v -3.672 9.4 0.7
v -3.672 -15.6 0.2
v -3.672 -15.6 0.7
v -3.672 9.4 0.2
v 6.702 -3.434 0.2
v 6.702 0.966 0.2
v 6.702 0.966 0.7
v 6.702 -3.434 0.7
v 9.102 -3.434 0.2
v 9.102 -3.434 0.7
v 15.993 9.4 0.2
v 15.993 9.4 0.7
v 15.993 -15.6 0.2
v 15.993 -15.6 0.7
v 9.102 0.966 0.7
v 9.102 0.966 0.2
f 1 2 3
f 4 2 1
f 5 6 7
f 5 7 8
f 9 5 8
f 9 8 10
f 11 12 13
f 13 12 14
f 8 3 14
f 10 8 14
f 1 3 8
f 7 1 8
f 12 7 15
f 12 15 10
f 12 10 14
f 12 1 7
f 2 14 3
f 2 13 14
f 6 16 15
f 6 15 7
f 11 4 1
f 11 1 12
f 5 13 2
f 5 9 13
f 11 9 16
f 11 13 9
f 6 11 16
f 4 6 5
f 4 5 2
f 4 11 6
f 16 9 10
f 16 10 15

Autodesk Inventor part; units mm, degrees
ref_plane "YZ Plane" through (0, 0, 0) normal (1, 0, 0) x (0, 1, 0)
ref_plane "XZ Plane" through (0, 0, 0) normal (0, 1, 0) x (-1, 0, 0)
ref_plane "XY Plane" through (0, 0, 0) normal (0, 0, 1) x (1, 0, 0)
sketch "Sketch1" plane through (0, 0, 0) normal (0, 0, 1) x (1, 0, 0)
  line L0 (9.1023, -3.4337) -> (9.1023, 0.9663) projected
  line L1 (6.7023, -3.4337) -> (9.1023, -3.4337) projected
  line L2 (6.7023, 0.9663) -> (6.7023, -3.4337) projected
  line L3 (9.1023, 0.9663) -> (6.7023, 0.9663) projected
  line L4 (-3.672, 5.3) -> (-3.672, 9.4)
  line L5 (17.5929, 9.4) -> (17.5929, -15.6) projected
  line L6 (17.5929, -15.6) -> (-3.672, -15.6)
  line L7 (-3.672, -15.6) -> (-3.672, 9.4)
  line L8 (-3.672, 9.4) -> (17.5929, 9.4)
  line L9 (17.5929, 9.4) -> (17.5929, -15.6)
  point P0 (0, 0)
extrude "Extrusion1" add sketch "Sketch1" along normal blind 0.7
sketch "Sketch2" plane through (0, 0, 0) normal (0, 0, -1) x (-1, 0, 0)
  line L0 (-17.5929, -15.6) -> (-17.5929, 9.4) projected
  line L1 (3.672, -15.6) -> (-17.5929, -15.6) projected
  line L2 (3.672, 9.4) -> (3.672, -15.6) projected
  line L3 (-17.5929, 9.4) -> (3.672, 9.4) projected
  line L4 (-9.1023, -3.4337) -> (-6.7023, -3.4337) projected
  line L5 (-9.1023, 0.9663) -> (-9.1023, -3.4337) projected
  line L6 (-6.7023, 0.9663) -> (-9.1023, 0.9663) projected
  line L7 (-6.7023, -3.4337) -> (-6.7023, 0.9663) projected
  point P0 (0, 0)
extrude "Extrusion2" cut sketch "Sketch2" against normal blind 0.2
sketch "Sketch3" plane through (0, 0, 0.7) normal (0, 0, 1) x (1, 0, 0)
  line L0 (15.9929, 9.4) -> (15.9929, -15.6) projected
  line L1 (15.9929, -15.6) -> (17.5929, -15.6) projected
  line L2 (17.5929, 9.4) -> (17.5929, -15.6) projected
  line L3 (15.9929, 9.4) -> (17.5929, 9.4) projected
  point P0 (0, 0)
extrude "Extrusion3" cut sketch "Sketch3" against normal through all
properties part number "przod"
